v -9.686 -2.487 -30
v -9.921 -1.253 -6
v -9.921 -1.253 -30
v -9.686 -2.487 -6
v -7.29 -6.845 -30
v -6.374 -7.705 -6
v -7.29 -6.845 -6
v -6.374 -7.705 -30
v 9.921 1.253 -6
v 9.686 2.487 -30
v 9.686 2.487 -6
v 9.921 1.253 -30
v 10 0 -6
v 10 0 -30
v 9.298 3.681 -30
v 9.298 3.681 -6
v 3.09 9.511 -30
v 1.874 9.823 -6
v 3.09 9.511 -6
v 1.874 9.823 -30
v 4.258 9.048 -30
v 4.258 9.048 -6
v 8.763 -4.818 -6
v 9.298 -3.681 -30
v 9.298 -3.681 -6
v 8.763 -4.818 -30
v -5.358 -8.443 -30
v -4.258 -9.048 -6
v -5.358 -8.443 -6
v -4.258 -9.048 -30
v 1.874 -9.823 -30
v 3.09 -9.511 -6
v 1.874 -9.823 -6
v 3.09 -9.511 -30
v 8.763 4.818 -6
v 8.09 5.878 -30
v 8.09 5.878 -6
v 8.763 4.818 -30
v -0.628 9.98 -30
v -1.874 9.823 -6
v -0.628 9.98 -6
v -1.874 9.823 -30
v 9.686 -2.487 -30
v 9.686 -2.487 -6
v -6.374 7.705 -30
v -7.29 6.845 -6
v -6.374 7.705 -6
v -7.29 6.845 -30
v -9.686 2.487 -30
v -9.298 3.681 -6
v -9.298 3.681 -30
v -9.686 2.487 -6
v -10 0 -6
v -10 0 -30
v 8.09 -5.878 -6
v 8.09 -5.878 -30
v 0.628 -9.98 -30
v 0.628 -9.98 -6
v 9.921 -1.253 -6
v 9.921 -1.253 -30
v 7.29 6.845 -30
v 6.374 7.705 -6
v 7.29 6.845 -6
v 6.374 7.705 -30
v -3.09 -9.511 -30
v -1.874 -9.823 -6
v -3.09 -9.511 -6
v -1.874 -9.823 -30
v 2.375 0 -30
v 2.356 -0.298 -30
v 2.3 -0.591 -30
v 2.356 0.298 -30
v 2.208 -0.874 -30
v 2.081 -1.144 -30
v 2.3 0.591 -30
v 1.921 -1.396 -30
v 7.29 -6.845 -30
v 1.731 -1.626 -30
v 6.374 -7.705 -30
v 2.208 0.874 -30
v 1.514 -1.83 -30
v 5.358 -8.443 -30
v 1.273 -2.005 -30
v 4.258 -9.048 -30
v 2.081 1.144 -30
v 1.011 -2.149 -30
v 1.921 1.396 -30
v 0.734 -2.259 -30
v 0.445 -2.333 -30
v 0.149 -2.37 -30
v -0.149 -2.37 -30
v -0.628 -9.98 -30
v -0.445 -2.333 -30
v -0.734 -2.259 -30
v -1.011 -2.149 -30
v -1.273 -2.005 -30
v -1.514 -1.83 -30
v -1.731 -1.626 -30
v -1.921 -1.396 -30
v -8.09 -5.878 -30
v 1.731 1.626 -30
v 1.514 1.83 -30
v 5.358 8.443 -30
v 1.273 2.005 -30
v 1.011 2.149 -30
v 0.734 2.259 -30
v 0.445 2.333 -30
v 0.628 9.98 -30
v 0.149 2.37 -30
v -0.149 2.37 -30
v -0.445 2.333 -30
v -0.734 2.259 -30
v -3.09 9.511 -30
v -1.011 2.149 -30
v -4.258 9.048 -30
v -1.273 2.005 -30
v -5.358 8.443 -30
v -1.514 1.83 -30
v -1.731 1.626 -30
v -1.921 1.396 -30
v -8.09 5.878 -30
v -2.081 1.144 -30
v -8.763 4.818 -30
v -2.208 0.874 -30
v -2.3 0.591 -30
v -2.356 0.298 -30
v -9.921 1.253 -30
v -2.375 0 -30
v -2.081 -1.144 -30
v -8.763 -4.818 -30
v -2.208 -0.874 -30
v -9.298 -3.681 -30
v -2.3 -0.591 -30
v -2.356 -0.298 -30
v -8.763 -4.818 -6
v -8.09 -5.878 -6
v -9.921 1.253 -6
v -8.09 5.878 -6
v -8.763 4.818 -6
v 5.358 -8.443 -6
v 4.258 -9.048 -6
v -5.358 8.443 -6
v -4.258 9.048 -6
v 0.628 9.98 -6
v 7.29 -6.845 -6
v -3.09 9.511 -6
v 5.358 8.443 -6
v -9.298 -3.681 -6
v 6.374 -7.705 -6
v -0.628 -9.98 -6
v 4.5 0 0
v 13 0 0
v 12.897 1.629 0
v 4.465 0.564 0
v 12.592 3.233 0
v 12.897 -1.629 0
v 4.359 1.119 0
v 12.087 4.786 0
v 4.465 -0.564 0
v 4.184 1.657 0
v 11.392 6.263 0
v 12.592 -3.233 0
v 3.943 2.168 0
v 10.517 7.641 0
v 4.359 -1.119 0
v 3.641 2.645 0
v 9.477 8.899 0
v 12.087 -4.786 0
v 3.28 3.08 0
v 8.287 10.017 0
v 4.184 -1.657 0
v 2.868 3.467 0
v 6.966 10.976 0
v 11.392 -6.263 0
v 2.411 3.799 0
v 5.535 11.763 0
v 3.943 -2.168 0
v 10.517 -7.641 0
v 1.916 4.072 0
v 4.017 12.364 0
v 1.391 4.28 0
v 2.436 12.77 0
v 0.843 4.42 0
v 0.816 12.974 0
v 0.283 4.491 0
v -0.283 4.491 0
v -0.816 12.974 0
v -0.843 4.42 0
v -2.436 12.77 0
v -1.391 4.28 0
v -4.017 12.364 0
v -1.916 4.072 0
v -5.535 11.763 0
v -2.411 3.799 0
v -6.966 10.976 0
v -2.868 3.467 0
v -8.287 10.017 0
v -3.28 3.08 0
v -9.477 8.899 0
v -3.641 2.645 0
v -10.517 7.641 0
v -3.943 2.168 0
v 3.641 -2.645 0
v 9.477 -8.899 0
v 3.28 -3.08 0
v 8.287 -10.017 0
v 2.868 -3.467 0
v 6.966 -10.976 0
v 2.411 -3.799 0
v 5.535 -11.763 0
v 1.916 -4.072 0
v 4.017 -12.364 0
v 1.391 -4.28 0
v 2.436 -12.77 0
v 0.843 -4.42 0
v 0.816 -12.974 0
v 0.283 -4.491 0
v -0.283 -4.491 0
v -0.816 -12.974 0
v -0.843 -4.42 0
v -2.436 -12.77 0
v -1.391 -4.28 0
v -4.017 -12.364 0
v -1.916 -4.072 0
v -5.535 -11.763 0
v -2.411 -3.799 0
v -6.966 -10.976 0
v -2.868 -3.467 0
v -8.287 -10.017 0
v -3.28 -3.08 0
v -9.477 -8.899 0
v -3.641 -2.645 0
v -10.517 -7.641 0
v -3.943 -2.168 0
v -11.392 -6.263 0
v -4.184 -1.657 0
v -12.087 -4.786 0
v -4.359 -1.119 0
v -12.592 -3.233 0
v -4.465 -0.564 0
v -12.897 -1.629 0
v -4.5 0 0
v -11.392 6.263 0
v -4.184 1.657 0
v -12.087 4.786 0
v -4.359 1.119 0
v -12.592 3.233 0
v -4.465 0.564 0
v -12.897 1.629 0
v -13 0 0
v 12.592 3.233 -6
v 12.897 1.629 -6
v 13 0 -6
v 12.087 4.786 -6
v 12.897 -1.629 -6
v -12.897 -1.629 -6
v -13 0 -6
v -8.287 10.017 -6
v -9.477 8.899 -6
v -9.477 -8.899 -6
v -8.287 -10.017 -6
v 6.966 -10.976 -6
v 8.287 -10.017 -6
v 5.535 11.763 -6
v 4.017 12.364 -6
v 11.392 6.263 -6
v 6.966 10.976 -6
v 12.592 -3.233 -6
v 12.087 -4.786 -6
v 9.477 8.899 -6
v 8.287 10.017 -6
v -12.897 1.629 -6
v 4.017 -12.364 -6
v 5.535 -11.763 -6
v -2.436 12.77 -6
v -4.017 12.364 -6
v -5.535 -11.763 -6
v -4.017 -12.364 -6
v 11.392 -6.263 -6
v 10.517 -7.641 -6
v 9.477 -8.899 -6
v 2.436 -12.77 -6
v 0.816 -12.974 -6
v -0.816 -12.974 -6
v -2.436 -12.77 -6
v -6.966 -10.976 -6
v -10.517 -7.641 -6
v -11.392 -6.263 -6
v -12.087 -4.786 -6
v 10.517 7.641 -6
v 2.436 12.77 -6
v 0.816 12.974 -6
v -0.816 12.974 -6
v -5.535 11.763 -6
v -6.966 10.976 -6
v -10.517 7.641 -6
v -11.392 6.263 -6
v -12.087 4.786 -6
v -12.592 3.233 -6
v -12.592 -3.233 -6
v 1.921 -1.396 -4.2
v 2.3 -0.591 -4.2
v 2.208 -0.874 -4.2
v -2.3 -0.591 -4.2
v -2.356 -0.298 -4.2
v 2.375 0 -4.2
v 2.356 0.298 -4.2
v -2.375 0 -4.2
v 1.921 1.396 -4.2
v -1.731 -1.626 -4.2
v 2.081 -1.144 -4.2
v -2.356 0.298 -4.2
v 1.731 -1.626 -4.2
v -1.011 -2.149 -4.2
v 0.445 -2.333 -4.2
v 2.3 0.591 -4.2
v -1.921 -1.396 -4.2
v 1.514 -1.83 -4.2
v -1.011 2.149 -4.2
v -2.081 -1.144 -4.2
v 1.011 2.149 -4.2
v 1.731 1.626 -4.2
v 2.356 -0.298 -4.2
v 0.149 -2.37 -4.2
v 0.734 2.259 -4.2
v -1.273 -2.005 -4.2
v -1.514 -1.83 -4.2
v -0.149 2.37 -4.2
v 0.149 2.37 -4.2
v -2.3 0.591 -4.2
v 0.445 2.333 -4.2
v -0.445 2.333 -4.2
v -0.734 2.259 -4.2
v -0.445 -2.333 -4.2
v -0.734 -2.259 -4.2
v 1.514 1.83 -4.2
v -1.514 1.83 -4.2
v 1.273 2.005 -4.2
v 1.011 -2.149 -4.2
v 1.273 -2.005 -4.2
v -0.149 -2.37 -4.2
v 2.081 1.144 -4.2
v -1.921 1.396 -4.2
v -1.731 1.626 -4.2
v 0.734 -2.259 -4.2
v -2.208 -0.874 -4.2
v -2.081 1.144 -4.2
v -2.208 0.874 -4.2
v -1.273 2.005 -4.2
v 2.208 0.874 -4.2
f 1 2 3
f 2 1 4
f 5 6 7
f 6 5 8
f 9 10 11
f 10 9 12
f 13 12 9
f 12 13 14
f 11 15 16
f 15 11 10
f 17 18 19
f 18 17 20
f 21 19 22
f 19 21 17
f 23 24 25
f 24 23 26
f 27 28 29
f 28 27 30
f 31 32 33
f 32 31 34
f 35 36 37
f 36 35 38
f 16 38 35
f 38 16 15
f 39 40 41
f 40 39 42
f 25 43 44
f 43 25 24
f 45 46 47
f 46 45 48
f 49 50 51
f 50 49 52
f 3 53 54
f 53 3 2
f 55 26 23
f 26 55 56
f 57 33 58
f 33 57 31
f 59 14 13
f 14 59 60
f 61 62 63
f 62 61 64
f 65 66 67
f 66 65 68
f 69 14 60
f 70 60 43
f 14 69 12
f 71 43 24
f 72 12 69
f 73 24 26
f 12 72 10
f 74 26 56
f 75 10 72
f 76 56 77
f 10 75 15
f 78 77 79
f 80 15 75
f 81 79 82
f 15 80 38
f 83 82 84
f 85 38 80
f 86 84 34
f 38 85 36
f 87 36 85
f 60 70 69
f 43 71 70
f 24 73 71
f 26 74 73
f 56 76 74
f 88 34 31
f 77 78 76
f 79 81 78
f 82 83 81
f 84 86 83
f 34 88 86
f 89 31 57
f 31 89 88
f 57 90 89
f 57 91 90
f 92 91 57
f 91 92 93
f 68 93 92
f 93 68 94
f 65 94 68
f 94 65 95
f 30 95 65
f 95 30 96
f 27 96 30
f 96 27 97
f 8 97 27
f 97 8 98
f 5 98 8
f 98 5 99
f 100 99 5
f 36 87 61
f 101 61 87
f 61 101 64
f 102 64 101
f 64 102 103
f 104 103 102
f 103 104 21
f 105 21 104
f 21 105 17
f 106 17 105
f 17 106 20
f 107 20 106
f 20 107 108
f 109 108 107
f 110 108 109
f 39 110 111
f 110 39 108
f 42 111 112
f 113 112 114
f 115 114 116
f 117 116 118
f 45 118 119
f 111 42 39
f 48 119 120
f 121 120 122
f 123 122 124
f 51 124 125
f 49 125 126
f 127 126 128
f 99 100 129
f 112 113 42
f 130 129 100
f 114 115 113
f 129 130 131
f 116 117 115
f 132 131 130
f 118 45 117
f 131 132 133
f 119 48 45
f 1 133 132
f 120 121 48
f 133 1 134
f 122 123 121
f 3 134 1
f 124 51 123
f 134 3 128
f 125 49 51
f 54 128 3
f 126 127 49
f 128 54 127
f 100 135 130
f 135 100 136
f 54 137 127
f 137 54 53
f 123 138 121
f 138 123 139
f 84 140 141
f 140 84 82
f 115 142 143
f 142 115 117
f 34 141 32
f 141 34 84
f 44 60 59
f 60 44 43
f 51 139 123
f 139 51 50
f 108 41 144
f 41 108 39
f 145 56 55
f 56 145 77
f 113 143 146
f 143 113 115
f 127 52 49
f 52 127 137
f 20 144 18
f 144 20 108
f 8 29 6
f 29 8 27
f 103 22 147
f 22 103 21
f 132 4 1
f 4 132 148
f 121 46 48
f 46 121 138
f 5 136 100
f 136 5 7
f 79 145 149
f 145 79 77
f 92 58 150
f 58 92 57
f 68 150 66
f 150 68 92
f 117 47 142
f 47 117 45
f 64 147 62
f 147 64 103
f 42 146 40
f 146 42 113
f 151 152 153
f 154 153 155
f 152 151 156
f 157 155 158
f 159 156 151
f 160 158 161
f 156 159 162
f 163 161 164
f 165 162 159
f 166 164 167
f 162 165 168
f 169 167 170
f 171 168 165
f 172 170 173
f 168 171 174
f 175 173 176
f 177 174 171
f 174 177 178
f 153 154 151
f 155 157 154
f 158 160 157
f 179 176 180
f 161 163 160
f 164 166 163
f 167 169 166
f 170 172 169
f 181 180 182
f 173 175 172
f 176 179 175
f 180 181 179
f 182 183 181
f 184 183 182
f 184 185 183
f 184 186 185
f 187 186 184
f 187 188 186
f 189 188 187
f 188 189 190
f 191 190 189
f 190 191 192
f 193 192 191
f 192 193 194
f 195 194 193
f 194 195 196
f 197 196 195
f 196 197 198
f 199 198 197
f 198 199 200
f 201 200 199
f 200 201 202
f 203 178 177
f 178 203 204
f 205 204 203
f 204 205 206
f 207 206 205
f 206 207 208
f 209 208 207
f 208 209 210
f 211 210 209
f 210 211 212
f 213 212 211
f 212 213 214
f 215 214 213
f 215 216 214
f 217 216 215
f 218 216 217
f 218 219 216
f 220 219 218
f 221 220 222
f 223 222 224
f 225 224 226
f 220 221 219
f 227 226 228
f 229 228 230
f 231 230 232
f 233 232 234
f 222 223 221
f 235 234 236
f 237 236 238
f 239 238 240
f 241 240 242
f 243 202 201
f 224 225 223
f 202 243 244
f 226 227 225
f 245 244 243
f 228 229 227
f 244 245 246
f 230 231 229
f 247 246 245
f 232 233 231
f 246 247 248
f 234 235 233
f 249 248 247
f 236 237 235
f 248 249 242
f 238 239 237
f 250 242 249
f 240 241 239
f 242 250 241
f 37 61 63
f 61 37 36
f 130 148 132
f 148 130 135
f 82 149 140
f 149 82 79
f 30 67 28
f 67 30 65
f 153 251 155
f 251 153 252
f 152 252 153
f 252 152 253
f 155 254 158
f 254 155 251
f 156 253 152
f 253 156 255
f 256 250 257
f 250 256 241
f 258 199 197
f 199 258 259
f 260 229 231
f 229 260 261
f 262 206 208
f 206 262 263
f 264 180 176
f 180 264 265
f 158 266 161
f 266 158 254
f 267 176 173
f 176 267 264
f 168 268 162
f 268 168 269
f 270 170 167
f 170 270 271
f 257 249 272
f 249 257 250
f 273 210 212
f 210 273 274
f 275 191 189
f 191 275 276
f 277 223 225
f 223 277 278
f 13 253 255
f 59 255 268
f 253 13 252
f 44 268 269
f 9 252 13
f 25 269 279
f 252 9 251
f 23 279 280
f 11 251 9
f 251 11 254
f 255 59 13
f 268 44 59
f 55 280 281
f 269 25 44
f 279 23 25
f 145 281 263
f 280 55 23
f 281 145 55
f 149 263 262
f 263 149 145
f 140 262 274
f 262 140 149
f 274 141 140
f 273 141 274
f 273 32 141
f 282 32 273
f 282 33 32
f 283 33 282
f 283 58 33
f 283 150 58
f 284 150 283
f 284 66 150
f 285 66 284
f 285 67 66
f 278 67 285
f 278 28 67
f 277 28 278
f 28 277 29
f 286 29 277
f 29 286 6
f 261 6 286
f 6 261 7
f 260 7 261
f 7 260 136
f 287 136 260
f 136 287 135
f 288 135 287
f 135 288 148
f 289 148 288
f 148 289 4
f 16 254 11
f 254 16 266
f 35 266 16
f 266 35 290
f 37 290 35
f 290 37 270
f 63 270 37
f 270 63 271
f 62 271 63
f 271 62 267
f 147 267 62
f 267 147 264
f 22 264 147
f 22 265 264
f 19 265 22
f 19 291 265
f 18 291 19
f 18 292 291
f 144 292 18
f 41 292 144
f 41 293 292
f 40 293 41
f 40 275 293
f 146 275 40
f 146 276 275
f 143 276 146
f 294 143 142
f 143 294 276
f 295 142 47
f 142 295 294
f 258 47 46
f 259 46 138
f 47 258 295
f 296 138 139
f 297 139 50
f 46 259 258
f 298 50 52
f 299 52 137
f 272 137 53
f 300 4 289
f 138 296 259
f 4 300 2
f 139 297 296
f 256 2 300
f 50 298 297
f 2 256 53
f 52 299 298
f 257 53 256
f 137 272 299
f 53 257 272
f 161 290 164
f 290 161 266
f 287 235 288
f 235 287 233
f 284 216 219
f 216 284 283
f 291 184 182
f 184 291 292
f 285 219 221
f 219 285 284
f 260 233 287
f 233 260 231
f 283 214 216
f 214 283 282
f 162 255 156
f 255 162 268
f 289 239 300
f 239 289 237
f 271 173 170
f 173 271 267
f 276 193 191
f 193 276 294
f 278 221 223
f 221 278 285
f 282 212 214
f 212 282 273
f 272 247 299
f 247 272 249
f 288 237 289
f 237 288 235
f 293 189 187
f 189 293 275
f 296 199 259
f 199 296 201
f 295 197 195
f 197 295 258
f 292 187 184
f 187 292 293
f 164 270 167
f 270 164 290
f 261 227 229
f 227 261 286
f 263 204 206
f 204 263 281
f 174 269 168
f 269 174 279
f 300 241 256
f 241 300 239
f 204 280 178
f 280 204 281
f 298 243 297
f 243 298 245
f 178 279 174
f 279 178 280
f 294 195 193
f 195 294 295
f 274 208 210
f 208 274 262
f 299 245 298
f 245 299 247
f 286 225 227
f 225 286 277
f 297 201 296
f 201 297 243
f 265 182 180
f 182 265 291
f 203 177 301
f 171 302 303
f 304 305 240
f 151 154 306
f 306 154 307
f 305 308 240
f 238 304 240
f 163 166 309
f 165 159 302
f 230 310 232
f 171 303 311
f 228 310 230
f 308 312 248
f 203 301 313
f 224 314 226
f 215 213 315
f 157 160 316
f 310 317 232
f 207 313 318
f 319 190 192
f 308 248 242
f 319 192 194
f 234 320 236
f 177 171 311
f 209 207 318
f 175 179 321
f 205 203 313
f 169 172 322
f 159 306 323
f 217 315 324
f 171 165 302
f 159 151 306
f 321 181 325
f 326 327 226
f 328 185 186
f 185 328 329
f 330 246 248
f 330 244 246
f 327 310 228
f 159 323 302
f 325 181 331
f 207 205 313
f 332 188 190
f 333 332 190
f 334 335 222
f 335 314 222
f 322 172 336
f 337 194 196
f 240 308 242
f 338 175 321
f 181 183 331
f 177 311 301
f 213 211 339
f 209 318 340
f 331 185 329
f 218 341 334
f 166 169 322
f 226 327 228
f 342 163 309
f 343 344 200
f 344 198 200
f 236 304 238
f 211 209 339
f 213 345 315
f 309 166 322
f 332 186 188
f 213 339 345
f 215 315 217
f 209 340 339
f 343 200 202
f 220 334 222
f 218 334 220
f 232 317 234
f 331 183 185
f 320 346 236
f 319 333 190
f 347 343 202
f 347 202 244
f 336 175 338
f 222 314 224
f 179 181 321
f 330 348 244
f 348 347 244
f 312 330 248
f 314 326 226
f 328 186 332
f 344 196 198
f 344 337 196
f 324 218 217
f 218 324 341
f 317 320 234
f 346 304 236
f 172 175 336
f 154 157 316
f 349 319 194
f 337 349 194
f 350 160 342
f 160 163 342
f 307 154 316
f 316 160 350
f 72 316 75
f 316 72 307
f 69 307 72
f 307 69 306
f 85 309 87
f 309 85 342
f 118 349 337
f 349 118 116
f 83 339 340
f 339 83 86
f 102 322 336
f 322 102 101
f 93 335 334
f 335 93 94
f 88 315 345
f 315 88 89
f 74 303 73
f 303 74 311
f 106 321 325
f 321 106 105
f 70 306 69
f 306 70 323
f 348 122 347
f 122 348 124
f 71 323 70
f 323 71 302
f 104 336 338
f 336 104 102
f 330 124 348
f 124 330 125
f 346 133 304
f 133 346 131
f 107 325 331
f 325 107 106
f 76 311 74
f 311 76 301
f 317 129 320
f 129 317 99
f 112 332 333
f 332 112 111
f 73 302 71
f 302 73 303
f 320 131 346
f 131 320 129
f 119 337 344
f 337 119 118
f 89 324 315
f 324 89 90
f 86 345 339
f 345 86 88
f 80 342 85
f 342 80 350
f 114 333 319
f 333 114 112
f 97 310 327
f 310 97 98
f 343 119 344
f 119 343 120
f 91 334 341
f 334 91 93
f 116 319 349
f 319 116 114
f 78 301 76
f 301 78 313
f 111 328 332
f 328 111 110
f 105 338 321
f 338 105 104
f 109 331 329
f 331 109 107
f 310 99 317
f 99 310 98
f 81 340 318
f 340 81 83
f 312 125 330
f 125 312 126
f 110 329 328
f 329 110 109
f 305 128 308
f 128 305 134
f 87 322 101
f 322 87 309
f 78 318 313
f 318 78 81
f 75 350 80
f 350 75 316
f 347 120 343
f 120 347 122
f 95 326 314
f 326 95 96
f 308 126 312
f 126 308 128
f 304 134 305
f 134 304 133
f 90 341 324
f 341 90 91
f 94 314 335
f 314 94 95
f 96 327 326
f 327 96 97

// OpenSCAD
$fn = 50;


difference() {
	union() {
		translate(v = [0, 0, -30.0000000000]) {
			cylinder(h = 30, r = 10.0000000000);
		}
		translate(v = [0, 0, -6.0000000000]) {
			cylinder(h = 6, r = 13.0000000000);
		}
	}
	union() {
		translate(v = [0, 0, 0]) {
			rotate(a = [0, 0, 0]) {
				difference() {
					union() {
						#translate(v = [0, 0, -30.0000000000]) {
							cylinder(h = 30, r = 2.2500000000);
						}
						#translate(v = [0, 0, -4.2000000000]) {
							cylinder(h = 4.2000000000, r1 = 2.3750000000, r2 = 4.5000000000);
						}
						#translate(v = [0, 0, -30.0000000000]) {
							cylinder(h = 30, r = 2.3750000000);
						}
						#translate(v = [0, 0, -30.0000000000]) {
							cylinder(h = 30, r = 2.2500000000);
						}
					}
					union();
				}
			}
		}
	}
}
